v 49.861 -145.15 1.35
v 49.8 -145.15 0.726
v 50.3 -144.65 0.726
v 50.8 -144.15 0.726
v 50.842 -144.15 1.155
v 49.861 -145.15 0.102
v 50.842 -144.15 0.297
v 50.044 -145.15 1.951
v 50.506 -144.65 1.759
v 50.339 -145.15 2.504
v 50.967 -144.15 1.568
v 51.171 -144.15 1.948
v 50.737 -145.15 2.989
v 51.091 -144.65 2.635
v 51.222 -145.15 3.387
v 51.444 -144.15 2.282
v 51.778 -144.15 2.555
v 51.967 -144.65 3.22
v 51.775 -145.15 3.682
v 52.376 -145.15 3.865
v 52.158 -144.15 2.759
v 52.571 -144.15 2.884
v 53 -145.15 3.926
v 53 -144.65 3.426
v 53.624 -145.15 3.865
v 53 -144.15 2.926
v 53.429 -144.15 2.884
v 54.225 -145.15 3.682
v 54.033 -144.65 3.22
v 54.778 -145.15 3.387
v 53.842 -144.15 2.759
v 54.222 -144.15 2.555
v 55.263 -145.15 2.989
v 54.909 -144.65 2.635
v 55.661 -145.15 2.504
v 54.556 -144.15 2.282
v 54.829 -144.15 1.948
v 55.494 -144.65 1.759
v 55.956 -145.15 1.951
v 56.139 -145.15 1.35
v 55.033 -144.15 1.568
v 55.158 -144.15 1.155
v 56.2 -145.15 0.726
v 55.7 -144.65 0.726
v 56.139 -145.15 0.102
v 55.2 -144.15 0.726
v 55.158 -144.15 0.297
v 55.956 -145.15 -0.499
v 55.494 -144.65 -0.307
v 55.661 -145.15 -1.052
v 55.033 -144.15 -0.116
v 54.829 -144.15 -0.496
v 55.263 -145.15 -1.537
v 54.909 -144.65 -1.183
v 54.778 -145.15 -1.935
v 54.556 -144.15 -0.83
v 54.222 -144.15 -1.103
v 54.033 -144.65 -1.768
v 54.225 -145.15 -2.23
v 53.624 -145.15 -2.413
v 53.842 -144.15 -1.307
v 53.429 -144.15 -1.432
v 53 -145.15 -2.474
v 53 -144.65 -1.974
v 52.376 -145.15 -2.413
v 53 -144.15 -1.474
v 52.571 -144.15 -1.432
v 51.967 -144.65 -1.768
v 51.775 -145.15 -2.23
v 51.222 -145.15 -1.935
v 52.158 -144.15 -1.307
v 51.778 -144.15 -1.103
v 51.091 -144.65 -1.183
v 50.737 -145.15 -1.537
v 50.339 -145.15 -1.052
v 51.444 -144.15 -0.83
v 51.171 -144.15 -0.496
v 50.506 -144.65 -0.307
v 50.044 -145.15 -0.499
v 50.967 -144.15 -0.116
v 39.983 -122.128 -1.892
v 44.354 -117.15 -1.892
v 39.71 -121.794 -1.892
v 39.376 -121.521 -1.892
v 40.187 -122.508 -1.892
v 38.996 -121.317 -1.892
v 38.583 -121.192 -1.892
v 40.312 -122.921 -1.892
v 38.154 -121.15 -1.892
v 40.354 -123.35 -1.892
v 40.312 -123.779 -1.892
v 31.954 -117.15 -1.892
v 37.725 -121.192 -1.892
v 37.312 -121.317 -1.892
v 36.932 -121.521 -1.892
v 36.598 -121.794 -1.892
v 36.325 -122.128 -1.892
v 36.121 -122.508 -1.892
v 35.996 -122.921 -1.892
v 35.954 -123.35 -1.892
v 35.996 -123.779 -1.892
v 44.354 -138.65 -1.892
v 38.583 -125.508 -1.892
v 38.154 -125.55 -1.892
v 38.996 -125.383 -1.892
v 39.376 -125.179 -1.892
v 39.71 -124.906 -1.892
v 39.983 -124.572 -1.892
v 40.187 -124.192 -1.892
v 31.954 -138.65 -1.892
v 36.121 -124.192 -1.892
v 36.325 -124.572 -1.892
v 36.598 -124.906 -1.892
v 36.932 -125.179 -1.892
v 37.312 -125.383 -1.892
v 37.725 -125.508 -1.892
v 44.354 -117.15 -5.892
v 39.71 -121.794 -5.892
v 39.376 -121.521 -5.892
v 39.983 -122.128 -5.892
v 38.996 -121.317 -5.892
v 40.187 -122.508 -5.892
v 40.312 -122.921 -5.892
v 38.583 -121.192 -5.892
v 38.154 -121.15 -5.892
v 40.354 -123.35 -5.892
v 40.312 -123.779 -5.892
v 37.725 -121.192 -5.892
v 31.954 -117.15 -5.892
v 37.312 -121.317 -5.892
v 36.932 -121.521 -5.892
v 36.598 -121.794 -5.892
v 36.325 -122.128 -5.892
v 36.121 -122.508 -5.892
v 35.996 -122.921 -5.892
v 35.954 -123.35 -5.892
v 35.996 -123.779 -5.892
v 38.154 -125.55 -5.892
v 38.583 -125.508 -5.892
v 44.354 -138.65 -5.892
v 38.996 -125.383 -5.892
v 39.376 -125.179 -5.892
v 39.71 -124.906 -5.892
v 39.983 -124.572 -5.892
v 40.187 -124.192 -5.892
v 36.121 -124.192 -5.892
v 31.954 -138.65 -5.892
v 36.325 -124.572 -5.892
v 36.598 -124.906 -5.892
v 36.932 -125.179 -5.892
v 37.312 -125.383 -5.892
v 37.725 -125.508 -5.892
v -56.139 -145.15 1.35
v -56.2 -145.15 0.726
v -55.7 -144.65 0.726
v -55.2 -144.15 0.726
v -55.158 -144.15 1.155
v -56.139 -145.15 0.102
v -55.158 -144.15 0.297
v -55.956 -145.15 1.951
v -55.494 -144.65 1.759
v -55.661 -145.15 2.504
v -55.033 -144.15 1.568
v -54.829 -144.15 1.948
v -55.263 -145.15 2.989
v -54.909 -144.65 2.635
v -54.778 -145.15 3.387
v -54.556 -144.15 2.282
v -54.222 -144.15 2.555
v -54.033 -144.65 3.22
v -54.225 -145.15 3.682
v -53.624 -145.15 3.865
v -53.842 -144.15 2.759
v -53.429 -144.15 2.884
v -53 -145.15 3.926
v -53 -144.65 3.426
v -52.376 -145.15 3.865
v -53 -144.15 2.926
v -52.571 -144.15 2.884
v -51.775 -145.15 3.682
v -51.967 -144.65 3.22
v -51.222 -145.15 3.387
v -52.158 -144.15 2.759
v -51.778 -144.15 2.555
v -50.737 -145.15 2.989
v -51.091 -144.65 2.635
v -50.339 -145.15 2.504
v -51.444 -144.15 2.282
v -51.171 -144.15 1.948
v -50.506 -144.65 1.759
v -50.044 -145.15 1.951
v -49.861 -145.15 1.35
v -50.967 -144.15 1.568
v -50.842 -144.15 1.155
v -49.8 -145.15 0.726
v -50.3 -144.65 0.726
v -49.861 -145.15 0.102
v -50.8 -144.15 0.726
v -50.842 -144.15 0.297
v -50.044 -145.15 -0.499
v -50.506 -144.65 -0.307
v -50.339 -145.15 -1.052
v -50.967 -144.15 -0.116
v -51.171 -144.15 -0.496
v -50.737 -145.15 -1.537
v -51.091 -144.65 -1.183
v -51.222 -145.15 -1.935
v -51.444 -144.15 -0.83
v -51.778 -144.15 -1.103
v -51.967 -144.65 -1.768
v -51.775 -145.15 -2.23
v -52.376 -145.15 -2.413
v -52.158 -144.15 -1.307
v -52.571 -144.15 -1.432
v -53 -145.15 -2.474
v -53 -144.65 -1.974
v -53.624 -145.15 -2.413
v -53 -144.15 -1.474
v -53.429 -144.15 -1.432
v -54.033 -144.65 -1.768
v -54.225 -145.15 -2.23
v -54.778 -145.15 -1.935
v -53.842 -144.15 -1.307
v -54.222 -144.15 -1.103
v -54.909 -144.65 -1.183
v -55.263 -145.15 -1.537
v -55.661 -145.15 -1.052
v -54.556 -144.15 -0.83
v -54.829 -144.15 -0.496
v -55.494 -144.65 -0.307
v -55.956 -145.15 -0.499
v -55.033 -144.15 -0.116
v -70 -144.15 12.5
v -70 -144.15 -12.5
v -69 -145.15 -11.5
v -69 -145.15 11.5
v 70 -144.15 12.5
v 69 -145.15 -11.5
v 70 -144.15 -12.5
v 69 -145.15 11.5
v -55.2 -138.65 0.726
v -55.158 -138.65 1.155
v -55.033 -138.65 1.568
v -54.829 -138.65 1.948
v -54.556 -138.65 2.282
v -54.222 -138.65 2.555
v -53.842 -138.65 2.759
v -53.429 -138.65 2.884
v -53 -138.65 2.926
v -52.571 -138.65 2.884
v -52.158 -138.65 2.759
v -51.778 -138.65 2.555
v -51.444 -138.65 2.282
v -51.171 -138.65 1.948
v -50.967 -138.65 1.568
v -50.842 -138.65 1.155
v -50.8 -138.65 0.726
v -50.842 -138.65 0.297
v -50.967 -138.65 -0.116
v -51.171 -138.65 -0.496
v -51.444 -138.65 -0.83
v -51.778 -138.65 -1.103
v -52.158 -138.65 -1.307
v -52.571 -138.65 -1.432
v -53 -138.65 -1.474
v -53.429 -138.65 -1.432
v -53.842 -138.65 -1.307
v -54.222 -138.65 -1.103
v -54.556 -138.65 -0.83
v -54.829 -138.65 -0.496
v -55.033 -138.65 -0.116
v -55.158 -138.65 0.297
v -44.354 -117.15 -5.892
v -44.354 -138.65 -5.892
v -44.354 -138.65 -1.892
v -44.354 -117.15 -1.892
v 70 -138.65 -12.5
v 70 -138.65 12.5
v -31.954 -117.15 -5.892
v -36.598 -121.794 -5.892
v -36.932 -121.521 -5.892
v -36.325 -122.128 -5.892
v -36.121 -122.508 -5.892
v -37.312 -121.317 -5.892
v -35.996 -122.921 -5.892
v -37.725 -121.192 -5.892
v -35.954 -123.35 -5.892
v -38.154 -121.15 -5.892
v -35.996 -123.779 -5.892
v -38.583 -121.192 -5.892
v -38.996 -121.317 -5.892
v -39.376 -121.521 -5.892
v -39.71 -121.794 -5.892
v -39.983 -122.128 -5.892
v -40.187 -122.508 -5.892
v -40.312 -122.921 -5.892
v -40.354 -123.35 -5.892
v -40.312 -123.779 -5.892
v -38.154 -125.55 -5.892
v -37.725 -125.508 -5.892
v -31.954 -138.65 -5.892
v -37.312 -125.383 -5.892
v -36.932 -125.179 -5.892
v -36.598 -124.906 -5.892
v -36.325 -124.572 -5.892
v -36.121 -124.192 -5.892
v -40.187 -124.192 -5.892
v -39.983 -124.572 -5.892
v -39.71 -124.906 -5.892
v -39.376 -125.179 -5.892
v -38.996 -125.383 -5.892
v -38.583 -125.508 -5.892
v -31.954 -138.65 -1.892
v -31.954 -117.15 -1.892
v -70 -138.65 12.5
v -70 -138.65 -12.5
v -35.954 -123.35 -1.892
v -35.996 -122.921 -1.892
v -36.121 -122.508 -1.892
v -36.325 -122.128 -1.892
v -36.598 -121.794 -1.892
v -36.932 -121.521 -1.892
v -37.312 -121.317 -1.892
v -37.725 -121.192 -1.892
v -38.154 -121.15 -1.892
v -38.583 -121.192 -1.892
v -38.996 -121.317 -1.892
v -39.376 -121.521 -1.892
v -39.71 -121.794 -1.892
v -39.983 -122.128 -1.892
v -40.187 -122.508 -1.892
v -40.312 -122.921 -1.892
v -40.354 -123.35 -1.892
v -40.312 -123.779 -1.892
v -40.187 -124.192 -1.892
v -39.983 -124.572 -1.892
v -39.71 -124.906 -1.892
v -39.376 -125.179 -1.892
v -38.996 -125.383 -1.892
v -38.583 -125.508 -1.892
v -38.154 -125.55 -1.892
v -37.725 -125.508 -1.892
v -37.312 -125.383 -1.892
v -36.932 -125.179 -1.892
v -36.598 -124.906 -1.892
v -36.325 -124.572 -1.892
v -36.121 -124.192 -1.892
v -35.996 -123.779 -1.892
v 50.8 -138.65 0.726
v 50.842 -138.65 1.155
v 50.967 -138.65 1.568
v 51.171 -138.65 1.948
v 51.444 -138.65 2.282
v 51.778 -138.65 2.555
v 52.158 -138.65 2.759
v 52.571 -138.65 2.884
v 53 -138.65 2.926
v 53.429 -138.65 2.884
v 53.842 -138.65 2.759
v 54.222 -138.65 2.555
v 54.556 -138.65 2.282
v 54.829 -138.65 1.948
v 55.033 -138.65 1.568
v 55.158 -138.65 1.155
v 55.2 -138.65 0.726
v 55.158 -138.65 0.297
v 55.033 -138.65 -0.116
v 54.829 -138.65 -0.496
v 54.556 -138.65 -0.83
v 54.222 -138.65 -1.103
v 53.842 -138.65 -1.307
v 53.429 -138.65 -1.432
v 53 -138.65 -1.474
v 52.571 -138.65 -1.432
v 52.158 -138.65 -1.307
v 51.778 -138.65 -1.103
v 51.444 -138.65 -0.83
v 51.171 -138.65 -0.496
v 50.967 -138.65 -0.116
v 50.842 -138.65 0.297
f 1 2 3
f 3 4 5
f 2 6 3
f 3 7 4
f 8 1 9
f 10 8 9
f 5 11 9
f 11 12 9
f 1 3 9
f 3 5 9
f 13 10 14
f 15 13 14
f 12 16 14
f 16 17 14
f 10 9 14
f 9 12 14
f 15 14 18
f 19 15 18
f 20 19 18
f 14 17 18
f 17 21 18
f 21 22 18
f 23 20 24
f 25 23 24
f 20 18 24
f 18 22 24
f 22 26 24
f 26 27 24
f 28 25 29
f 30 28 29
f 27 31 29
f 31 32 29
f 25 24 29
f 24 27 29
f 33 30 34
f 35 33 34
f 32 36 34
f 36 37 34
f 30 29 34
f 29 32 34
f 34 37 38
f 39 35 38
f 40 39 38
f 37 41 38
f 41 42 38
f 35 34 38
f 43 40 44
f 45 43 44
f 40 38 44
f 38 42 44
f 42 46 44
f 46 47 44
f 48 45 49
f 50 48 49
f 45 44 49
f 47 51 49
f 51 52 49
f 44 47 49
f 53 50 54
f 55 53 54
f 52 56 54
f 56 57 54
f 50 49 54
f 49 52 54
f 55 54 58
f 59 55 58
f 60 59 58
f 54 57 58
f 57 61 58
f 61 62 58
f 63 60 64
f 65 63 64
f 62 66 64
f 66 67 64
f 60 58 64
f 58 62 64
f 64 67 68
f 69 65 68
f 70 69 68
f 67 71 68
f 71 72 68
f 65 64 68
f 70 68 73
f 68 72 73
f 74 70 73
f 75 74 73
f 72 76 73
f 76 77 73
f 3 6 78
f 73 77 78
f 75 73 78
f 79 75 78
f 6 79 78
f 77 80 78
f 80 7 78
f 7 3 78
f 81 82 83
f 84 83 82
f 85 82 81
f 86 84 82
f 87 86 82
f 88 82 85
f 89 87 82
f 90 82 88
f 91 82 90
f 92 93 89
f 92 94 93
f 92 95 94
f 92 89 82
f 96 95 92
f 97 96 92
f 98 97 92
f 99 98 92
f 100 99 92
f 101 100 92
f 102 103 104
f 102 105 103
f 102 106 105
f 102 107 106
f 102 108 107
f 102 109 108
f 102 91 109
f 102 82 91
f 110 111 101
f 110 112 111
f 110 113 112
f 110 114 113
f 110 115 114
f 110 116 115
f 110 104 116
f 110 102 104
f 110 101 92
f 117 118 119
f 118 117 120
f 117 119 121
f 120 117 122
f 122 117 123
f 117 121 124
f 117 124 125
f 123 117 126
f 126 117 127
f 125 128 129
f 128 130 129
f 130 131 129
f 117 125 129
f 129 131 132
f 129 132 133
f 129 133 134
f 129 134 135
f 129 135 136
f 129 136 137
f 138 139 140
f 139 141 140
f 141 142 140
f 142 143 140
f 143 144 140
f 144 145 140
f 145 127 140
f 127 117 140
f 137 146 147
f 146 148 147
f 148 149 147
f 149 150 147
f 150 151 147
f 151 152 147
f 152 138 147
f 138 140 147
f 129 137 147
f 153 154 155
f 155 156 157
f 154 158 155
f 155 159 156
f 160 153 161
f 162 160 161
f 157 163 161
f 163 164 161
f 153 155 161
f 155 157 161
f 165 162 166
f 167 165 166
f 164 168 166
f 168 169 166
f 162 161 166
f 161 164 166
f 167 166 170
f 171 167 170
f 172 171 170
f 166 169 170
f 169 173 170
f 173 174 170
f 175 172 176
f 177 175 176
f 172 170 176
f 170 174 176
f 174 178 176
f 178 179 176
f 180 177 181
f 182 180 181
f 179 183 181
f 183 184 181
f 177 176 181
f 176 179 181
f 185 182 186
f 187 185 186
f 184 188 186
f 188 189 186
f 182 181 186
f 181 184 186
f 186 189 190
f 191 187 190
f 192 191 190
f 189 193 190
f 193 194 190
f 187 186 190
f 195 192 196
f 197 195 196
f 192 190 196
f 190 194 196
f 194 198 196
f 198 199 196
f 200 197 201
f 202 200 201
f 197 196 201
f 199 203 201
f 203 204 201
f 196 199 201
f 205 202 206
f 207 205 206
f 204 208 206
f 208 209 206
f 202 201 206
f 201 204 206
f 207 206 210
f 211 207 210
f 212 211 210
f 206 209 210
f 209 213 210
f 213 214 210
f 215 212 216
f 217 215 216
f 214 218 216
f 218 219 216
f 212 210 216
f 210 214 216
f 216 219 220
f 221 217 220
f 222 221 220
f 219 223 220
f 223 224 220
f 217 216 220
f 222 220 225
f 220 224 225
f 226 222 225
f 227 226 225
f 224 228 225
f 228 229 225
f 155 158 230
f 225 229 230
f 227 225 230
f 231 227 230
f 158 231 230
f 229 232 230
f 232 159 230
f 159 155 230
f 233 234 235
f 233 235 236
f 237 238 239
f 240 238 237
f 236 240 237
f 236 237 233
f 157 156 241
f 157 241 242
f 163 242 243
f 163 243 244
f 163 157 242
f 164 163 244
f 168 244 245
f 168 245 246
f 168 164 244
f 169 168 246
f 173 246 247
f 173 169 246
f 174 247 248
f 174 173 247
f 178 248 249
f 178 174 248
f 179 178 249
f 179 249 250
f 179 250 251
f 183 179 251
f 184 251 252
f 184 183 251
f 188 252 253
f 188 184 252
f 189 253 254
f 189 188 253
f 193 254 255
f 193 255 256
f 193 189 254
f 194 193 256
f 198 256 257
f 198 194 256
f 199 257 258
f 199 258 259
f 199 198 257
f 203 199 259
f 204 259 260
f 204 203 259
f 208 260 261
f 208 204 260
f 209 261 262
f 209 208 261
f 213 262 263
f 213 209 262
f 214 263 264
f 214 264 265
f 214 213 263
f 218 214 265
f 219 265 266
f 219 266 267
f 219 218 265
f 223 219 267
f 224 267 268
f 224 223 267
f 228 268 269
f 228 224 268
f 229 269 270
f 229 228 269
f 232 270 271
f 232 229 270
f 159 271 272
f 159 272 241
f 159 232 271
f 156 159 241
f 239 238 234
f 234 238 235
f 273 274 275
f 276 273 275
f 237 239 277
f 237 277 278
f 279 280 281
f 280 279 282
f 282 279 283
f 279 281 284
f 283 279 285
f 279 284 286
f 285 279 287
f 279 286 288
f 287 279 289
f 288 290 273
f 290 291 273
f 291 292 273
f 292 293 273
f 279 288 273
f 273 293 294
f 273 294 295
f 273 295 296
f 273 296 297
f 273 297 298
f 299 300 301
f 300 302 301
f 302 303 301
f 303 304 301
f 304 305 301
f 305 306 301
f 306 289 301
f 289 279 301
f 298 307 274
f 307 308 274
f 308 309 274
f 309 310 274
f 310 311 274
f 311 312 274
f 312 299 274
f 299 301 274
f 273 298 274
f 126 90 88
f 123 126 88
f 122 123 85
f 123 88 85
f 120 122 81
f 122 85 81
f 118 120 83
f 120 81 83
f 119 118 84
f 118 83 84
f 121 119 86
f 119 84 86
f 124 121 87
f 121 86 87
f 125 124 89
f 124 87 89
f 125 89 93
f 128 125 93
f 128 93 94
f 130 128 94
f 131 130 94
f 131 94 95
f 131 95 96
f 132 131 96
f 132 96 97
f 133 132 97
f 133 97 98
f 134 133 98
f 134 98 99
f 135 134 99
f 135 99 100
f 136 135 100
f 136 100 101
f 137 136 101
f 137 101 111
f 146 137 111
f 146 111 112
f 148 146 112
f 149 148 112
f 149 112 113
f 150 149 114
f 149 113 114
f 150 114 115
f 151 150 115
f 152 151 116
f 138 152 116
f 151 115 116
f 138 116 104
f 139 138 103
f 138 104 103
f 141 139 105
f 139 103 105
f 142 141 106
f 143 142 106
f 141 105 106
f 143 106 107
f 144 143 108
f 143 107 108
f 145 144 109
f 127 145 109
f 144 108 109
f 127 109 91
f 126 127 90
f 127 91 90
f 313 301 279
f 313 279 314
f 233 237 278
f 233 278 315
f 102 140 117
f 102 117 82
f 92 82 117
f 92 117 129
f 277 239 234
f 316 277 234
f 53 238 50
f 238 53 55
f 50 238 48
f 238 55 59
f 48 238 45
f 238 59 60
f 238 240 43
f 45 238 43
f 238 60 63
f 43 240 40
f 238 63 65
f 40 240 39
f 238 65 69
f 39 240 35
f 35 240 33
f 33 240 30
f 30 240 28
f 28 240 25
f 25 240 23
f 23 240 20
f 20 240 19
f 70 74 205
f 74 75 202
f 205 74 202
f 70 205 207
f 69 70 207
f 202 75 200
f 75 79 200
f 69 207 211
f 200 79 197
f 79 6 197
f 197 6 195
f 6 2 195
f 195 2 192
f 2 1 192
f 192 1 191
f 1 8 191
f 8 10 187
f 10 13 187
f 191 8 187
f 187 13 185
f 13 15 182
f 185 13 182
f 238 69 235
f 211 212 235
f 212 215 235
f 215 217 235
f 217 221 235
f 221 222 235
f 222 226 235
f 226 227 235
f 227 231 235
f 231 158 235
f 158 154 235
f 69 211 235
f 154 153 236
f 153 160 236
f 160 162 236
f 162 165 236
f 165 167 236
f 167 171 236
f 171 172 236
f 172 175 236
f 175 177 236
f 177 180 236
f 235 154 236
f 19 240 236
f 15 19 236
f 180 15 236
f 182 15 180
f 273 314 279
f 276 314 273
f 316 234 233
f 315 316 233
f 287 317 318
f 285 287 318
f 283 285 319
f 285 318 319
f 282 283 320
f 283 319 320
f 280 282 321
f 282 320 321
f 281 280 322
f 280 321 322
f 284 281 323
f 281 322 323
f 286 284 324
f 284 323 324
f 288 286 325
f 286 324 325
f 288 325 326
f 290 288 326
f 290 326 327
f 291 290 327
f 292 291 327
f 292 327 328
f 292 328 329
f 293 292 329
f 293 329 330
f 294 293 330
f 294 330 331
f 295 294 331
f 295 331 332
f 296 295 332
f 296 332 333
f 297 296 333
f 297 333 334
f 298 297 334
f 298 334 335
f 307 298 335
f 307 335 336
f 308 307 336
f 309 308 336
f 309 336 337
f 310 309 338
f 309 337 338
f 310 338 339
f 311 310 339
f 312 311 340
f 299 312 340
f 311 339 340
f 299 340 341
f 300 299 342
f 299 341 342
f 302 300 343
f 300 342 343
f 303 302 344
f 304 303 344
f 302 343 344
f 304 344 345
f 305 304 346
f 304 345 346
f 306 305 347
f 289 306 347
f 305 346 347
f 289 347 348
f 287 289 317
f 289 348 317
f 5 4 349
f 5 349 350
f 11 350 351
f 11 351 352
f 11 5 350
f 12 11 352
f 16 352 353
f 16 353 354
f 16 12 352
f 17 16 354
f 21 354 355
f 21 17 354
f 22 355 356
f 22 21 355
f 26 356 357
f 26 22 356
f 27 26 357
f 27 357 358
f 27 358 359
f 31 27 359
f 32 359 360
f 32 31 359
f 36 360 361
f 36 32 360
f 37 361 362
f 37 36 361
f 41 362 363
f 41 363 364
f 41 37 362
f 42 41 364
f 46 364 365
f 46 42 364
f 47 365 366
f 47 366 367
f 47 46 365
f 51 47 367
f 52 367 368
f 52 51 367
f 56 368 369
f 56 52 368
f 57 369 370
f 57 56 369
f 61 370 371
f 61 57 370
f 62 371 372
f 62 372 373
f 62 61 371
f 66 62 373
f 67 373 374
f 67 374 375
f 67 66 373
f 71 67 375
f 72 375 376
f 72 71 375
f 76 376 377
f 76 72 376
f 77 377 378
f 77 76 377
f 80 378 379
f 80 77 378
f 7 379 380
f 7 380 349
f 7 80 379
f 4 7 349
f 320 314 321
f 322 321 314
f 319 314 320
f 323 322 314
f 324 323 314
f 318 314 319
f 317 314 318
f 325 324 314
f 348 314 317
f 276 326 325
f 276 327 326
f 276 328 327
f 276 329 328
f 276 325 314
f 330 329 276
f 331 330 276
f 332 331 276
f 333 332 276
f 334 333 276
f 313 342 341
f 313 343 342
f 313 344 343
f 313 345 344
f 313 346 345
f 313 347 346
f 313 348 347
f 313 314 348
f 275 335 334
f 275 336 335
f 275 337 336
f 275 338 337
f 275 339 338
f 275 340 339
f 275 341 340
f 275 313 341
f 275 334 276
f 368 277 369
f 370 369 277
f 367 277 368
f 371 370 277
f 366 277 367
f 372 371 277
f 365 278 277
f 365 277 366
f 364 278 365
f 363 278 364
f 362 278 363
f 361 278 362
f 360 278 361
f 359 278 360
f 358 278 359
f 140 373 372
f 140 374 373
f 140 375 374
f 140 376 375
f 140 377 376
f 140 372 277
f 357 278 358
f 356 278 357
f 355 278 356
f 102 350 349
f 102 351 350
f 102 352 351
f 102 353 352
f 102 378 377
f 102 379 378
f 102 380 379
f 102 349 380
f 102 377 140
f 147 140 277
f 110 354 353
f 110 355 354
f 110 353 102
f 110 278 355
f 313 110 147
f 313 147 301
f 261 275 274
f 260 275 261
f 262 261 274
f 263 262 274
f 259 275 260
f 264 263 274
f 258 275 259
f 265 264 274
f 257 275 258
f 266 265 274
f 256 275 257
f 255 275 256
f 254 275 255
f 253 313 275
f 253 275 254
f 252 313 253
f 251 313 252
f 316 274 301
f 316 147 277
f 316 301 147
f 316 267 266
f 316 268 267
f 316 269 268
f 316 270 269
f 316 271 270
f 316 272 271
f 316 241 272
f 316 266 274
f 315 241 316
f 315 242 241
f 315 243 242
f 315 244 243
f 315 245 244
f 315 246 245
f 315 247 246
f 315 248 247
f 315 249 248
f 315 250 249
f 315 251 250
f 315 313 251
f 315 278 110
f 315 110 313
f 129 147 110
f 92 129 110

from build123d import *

# Parameters (mm, degrees)
SKETCH059_W             = 140
SKETCH059_H             = 25
SKETCH059_R             = 2.2
PAD026_DEPTH            = 6.5
SKETCH060_W             = 12.4
SKETCH060_H             = 4
PAD027_DEPTH            = 21.5
SKETCH061_R             = 2.2
POCKET032_DEPTH         = 10.609
CHAMFER024_SIZE         = 1
BODY013_ROLL_ANGLE      = 90
BODY013_PLACEMENT_ANGLE = 180


with BuildPart() as part:
    # Sketch059 → Pad026 (new body)
    with BuildSketch(Plane.XY):
        Rectangle(SKETCH059_W, SKETCH059_H)
        with Locations((-53, 0.726)):
            Circle(SKETCH059_R, mode=Mode.SUBTRACT)
        with Locations((53, 0.726)):
            Circle(SKETCH059_R, mode=Mode.SUBTRACT)
    extrude(amount=PAD026_DEPTH)

    # Sketch060 (on Face8 of Pad026) → Pad027 (join)
    with BuildSketch(Plane.XY.offset(6.5)):
        with Locations((-38.154, -3.892)):
            Rectangle(SKETCH060_W, SKETCH060_H)
        with Locations((38.154, -3.892)):
            Rectangle(SKETCH060_W, SKETCH060_H)
    extrude(amount=PAD027_DEPTH)

    # Sketch061 (on Face12 of Pad027) → Pocket032 (cut, through all)
    with BuildSketch(Plane(origin=(0, -1.892, 0), x_dir=(-1, 0, 0), z_dir=(0, 1, 0))):
        with Locations((-38.154, 21.8)):
            Circle(SKETCH061_R)
        with Locations((38.154, 21.8)):
            Circle(SKETCH061_R)
    extrude(amount=-POCKET032_DEPTH, mode=Mode.SUBTRACT)

    # Chamfer024
    chamfer024_edges = [part.edges().sort_by_distance(p)[0] for p in [
        (0, 12.5, 0),
        (70, 0, 0),
        (0, -12.5, 0),
        (-70, 0, 0),
        (50.8, 0.726, 0),
        (-55.2, 0.726, 0),
    ]]
    chamfer(chamfer024_edges, length=CHAMFER024_SIZE)


with BuildPart() as part_1:
    # Body013 roll: moved
    add(part.part.rotate(Axis((0, 0, 0), (1, 0, 0)), BODY013_ROLL_ANGLE))


with BuildPart() as part_2:
    # Body013 placement: moved
    add(part_1.part.moved(Location((0, -145.15, 0))).rotate(Axis((0, -145.15, 0), (0, 0, 1)), BODY013_PLACEMENT_ANGLE))


solid = part_2.part
